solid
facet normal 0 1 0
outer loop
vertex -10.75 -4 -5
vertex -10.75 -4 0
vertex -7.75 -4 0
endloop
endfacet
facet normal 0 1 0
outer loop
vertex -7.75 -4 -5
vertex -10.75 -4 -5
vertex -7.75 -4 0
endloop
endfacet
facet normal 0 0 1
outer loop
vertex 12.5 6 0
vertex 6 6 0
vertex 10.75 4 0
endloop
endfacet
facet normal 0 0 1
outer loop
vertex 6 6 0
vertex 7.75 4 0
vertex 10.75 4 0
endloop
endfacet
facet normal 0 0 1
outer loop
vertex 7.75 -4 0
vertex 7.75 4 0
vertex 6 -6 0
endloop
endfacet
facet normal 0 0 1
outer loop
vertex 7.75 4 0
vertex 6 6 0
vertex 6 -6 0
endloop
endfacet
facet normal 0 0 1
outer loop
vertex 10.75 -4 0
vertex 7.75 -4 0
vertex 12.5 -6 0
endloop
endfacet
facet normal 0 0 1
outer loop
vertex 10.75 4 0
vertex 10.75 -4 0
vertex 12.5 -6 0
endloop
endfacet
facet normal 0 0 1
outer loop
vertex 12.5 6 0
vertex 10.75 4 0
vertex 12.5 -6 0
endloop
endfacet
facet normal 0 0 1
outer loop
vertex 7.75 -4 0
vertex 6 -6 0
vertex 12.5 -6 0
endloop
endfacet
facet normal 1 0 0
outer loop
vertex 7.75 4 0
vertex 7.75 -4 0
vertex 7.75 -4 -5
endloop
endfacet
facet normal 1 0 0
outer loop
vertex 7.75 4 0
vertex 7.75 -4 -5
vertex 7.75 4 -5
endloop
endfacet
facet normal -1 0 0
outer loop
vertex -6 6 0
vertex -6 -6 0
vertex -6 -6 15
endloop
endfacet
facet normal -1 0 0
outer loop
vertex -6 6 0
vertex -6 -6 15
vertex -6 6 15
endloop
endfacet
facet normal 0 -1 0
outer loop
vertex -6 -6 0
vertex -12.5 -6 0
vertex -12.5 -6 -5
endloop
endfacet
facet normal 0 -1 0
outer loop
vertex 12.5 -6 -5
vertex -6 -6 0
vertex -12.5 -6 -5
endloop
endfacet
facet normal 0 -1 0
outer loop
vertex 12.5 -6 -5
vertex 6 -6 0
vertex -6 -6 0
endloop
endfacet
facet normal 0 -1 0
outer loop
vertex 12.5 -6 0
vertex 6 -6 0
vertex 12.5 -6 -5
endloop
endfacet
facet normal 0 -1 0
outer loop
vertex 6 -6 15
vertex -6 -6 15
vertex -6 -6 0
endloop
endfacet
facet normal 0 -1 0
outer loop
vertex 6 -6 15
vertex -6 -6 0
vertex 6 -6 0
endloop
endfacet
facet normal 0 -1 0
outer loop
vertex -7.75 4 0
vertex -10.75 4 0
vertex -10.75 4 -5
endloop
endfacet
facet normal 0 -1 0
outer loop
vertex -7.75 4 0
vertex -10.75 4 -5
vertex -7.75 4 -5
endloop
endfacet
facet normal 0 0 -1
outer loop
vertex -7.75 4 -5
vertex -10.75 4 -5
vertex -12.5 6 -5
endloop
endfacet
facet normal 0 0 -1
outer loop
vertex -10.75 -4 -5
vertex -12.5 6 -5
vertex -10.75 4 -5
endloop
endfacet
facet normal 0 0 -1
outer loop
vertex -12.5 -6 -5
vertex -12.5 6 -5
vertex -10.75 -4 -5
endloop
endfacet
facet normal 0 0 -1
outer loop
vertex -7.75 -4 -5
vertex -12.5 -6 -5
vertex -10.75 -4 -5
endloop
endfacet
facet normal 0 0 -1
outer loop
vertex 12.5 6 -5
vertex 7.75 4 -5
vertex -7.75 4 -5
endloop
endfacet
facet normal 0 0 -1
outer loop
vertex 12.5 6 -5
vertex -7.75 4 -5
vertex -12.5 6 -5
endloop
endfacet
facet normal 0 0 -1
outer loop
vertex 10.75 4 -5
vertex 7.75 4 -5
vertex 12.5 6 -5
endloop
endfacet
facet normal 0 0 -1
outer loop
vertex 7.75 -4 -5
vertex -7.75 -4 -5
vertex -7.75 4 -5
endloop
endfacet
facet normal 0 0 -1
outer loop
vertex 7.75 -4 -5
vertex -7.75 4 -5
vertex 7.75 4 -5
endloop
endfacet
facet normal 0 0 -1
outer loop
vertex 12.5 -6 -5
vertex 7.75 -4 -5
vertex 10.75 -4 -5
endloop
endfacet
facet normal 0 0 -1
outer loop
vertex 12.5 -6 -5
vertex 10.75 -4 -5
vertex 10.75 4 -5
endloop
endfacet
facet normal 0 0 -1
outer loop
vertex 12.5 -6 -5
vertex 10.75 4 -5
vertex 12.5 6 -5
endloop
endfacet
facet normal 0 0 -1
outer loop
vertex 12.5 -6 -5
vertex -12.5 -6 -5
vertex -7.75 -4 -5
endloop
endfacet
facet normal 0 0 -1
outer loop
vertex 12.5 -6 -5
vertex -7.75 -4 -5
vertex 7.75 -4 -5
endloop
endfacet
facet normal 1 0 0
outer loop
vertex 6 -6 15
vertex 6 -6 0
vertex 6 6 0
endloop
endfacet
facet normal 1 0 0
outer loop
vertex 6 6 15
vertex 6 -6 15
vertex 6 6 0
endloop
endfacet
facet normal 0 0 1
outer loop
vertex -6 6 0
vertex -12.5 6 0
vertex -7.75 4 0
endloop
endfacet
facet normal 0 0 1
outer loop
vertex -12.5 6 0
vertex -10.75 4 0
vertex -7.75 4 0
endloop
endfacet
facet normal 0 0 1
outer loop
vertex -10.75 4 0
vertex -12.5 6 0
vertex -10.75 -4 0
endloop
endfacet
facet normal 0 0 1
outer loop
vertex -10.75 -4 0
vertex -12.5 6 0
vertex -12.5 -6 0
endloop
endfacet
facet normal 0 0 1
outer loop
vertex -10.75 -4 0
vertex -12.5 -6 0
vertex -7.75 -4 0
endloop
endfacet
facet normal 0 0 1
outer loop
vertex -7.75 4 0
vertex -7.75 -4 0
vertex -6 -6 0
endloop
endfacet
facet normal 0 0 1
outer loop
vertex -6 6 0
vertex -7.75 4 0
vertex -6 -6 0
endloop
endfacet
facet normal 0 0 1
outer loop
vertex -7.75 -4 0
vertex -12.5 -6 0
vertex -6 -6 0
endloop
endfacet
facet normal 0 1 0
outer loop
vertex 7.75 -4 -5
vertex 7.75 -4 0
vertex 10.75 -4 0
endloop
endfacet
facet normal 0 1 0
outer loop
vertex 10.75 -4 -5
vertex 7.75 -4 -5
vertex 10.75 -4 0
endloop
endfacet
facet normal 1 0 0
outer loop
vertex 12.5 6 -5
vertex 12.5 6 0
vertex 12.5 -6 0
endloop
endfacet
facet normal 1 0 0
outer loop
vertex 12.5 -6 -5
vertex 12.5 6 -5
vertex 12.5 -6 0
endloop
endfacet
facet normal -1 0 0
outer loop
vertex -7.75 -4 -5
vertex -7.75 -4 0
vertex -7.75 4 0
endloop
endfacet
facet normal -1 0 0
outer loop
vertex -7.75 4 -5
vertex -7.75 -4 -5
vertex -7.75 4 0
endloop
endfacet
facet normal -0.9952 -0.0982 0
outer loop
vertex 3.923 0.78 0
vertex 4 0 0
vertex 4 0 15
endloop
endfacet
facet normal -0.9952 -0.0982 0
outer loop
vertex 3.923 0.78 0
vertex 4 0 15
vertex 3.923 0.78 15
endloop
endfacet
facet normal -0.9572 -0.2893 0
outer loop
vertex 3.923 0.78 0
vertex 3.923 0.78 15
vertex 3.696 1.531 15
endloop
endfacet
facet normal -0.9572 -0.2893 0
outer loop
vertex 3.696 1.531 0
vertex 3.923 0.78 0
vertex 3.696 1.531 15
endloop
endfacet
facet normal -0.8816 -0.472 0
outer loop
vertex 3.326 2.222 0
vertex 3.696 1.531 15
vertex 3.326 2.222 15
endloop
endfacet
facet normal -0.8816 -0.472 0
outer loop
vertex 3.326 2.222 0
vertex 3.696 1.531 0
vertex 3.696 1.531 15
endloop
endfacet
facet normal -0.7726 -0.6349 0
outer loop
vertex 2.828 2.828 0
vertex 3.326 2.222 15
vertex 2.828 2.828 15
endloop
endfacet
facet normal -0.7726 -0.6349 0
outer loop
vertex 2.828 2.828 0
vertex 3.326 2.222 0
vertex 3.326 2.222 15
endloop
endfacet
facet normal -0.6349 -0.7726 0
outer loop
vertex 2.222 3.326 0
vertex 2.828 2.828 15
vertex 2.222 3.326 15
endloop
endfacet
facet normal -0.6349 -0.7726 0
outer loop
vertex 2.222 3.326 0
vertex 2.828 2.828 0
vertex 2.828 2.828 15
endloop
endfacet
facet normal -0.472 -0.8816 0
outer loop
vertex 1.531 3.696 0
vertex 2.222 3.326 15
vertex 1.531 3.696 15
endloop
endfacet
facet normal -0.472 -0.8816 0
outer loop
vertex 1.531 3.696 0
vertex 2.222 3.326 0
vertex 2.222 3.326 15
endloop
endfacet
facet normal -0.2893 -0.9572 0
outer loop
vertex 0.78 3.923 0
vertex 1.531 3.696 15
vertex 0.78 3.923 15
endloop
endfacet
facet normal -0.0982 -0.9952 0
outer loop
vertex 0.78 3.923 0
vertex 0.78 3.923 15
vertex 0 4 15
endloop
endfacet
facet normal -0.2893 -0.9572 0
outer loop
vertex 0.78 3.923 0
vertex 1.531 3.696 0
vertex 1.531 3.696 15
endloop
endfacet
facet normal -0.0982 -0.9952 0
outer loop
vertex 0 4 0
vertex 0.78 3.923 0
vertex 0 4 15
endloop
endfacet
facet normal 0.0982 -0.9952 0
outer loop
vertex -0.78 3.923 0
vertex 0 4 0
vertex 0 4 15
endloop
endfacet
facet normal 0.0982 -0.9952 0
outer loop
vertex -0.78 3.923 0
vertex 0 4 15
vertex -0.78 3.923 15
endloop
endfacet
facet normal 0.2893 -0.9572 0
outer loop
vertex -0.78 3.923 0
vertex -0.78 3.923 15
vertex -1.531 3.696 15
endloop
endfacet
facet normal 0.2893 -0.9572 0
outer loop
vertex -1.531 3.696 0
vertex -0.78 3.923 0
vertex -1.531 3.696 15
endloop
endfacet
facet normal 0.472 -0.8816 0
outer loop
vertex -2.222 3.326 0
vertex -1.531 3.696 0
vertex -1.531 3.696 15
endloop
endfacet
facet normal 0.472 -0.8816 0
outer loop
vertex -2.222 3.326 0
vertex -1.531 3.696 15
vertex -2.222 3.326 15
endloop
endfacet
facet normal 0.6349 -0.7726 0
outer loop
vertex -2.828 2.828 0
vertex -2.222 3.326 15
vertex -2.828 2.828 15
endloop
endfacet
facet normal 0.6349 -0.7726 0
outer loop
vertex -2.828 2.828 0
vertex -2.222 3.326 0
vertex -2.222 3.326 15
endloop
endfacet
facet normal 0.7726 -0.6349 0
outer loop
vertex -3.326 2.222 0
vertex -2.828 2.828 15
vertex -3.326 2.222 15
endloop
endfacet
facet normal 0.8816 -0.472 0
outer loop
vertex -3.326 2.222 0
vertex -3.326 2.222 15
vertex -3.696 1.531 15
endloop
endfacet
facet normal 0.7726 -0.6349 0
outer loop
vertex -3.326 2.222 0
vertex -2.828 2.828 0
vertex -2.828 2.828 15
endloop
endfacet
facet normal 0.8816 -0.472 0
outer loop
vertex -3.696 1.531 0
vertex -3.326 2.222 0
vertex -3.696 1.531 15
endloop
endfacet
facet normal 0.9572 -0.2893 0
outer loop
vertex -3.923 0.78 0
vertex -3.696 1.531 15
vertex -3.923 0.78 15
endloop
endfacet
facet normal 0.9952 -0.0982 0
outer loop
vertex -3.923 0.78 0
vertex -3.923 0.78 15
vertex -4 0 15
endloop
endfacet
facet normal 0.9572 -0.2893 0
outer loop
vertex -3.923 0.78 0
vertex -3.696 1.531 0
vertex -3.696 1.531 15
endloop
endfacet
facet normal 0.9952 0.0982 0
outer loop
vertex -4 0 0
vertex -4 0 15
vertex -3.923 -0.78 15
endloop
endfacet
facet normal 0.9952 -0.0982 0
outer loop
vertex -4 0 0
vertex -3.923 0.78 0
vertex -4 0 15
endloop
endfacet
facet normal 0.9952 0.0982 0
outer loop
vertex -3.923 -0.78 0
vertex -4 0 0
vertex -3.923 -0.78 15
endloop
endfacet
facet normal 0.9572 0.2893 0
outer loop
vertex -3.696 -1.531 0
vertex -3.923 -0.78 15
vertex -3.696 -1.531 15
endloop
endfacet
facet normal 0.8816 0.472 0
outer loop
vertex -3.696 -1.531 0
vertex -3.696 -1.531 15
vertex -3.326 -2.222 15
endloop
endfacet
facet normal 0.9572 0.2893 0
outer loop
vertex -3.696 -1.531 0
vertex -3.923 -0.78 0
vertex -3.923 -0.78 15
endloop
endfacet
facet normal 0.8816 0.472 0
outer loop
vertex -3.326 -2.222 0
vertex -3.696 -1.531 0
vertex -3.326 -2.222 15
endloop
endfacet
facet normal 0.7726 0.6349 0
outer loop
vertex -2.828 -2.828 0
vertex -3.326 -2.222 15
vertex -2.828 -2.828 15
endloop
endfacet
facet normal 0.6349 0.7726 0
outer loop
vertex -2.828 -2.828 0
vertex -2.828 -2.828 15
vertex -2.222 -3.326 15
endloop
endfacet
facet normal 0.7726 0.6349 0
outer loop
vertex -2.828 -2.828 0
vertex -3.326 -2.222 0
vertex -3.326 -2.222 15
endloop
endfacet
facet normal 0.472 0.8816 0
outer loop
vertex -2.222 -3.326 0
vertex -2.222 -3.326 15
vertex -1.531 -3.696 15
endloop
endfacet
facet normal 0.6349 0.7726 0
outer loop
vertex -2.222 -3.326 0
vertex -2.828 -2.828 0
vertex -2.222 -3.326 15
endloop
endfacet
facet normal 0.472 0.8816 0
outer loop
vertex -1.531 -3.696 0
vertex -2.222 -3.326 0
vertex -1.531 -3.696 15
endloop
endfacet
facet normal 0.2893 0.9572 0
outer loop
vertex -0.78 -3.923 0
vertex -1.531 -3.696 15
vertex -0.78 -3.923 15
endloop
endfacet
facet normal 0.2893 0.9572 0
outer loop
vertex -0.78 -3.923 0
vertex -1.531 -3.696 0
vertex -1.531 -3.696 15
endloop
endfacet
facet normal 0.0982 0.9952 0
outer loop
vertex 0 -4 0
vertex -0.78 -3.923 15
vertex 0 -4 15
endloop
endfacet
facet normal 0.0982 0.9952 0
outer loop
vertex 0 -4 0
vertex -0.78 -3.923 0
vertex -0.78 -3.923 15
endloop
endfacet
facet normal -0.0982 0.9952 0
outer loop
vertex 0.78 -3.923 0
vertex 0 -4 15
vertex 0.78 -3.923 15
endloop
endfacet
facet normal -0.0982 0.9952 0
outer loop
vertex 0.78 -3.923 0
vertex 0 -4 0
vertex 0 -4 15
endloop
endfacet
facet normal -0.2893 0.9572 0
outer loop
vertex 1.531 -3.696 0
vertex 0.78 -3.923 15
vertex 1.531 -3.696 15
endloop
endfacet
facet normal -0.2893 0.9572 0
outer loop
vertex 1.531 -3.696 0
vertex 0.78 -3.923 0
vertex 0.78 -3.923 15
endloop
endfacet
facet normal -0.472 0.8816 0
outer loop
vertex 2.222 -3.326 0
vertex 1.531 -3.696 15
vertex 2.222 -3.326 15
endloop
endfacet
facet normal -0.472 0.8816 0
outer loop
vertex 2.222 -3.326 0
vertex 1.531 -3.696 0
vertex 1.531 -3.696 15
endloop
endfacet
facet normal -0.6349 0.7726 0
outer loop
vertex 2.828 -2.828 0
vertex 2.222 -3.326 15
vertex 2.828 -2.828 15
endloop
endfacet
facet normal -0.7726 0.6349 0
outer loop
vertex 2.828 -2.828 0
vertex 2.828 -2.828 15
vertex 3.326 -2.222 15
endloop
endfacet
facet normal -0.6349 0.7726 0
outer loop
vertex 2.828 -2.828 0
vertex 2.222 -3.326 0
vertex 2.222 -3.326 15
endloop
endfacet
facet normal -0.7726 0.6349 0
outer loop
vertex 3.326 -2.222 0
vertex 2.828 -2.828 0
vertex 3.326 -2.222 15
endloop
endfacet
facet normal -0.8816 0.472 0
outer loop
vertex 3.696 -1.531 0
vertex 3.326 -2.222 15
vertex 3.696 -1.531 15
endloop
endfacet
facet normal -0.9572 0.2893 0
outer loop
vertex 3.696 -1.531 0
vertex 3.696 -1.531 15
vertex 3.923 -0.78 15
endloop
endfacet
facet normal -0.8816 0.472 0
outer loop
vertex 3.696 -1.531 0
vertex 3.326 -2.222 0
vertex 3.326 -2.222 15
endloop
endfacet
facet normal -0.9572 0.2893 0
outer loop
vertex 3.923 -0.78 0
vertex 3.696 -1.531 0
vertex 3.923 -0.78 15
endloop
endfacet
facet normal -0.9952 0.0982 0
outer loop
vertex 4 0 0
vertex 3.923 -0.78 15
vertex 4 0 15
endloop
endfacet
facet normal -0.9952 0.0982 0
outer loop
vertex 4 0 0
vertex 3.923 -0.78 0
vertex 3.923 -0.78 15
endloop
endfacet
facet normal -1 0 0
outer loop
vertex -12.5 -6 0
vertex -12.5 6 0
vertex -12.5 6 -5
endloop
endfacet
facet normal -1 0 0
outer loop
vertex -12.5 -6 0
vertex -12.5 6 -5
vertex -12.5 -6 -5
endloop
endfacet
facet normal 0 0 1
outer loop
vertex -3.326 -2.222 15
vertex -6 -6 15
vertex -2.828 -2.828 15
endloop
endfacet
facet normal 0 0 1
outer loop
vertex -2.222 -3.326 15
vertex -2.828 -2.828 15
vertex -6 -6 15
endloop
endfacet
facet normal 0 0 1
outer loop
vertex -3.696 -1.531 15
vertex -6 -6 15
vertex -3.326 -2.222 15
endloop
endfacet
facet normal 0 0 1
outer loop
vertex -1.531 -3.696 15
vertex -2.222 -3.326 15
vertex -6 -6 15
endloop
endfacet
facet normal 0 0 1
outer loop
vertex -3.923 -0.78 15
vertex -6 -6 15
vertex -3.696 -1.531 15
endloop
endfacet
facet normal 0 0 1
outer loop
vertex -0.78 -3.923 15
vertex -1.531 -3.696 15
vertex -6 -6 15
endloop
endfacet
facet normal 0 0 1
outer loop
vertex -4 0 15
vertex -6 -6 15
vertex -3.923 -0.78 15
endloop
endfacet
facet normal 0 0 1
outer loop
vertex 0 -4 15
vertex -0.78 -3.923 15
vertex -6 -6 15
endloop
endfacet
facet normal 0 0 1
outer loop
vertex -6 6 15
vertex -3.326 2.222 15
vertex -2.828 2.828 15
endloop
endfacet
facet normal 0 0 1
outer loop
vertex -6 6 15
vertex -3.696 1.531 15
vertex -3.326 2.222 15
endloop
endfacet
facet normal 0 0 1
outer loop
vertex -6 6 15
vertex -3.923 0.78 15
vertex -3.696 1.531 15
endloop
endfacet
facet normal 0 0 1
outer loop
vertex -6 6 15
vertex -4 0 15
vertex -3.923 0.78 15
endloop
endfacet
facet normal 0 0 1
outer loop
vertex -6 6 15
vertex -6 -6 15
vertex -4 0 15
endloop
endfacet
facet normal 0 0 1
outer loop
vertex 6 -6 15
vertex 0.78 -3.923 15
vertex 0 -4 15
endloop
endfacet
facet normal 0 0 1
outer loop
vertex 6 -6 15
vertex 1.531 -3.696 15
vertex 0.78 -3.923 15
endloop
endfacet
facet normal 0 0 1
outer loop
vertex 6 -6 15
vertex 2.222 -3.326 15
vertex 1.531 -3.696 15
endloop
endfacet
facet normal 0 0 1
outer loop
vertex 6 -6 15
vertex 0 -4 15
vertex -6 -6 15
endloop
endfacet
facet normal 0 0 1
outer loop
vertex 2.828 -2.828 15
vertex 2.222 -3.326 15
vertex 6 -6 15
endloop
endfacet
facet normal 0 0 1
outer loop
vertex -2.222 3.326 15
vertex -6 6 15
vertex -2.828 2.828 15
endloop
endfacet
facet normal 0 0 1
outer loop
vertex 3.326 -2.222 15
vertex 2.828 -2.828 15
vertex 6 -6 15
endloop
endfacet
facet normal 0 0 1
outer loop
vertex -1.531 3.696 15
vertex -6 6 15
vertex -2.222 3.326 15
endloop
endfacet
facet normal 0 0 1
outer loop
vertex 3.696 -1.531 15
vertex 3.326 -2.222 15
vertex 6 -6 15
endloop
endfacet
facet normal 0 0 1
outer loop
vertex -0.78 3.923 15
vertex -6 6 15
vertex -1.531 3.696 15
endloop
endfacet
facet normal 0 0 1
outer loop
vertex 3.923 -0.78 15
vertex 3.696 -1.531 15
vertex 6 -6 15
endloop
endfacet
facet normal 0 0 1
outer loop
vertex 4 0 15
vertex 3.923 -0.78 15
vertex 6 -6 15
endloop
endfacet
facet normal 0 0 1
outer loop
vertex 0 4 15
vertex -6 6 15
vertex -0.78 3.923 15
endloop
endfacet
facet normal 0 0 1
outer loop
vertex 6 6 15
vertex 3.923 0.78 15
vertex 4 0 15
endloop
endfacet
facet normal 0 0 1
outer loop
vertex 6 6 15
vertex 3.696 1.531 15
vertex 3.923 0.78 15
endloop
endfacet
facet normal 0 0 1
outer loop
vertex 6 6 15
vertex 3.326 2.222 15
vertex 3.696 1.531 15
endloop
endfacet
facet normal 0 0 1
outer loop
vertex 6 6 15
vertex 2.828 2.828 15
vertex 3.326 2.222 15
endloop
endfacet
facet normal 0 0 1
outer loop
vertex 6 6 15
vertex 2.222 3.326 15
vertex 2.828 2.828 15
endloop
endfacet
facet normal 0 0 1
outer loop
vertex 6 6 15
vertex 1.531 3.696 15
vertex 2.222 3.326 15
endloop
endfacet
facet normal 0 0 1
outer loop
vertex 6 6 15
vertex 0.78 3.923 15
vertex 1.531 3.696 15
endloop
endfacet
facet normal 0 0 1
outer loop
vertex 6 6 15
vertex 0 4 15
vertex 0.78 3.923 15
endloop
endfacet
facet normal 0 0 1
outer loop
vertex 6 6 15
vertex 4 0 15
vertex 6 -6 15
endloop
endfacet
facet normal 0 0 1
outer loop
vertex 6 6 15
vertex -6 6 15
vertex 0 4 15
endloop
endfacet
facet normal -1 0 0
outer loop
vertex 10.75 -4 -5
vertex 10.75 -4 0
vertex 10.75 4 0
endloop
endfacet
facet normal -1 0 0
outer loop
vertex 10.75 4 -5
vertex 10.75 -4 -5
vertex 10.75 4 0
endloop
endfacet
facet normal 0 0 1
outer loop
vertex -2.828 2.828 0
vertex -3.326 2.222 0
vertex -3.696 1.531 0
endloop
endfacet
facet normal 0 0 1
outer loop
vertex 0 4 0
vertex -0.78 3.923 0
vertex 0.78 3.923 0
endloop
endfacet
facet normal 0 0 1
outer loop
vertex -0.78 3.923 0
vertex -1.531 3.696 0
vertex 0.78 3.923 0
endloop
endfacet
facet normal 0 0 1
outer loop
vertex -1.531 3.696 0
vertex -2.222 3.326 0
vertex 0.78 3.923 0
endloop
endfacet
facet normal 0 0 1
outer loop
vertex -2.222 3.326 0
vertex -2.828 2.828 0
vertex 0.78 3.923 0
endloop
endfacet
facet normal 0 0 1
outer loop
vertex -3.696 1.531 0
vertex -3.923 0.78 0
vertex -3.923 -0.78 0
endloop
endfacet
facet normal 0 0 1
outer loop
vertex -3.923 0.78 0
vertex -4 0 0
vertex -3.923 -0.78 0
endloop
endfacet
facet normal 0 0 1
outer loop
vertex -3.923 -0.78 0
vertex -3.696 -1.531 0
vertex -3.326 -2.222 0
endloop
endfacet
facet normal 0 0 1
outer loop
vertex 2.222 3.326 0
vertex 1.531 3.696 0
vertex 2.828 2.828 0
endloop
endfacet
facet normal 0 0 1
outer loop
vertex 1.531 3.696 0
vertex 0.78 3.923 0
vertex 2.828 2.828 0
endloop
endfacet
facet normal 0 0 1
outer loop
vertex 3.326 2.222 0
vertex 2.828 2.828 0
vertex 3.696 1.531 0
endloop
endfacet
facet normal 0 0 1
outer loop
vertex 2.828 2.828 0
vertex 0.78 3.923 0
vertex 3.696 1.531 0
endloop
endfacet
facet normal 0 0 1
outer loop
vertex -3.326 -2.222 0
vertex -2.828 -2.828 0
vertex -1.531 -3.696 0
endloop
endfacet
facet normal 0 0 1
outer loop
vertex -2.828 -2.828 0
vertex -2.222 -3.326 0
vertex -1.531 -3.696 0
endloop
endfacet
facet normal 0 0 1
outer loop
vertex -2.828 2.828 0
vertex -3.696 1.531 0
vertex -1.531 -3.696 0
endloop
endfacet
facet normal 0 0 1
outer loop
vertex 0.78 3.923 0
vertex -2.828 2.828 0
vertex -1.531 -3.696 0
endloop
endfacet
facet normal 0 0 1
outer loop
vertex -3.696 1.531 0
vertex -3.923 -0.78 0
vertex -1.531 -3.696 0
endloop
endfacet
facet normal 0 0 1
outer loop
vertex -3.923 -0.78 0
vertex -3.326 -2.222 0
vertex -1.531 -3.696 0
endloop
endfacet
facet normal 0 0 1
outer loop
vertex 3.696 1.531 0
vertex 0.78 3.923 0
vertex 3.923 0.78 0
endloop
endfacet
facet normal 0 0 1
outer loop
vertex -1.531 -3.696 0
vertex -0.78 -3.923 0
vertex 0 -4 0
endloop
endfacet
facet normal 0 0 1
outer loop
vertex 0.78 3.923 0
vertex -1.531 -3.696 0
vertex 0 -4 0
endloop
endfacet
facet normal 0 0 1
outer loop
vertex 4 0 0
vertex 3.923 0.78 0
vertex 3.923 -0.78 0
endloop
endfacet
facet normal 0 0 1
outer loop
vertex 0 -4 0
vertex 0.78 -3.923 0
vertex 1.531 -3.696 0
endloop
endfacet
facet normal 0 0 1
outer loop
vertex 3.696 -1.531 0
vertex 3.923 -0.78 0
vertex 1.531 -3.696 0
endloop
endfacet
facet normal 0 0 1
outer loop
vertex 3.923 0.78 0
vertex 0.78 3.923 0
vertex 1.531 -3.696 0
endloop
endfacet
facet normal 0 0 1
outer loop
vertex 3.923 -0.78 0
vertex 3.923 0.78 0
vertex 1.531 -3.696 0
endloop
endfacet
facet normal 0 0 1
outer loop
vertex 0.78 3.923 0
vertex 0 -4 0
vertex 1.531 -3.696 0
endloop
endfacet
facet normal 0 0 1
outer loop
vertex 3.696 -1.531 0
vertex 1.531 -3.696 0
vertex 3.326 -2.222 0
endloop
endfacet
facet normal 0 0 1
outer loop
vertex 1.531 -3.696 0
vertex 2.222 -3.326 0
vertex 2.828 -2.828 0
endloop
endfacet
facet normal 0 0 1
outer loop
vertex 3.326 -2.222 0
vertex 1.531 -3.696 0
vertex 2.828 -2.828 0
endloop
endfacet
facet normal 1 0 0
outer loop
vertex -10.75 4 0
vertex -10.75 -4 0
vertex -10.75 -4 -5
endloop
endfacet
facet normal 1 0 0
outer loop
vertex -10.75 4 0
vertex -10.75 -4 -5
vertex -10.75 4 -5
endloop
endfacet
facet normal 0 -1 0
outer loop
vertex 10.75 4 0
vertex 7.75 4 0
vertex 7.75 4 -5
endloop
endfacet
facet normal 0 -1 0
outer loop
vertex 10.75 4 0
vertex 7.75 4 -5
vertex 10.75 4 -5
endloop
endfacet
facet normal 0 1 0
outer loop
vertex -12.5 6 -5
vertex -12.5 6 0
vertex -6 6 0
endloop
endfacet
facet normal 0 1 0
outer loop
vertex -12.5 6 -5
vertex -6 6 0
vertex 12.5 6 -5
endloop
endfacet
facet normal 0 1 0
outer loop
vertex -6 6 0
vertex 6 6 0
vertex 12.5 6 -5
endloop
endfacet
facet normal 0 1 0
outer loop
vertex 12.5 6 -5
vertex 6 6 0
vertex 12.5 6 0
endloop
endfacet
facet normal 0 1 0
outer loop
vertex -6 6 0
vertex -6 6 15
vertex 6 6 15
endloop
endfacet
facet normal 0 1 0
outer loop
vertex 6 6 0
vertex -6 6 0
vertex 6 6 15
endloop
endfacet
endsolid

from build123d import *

# Parameters (mm, degrees)
F0_W     = 12
F0_H     = 12
F0_R     = 4
F1_DEPTH = 15
F2_W     = 25
F2_H     = 12
F3_DEPTH = 5
F4_W     = 3
F4_H     = 8
F5_DEPTH = 5


with BuildPart() as f1:
    # F0 (on Top) → F1 (new body)
    with BuildSketch(Plane.XY):
        Rectangle(F0_W, F0_H)
        Circle(F0_R, mode=Mode.SUBTRACT)
    extrude(amount=F1_DEPTH)

    # F2 (on face) → F3 (join)
    with BuildSketch(Plane(origin=(0, 0, 0), x_dir=(1, 0, 0), z_dir=(0, 0, -1))):
        Rectangle(F2_W, F2_H)
    extrude(amount=F3_DEPTH)

    # F4 (on face) → F5 (cut)
    with BuildSketch(Plane.XY):
        with Locations((-9.25, 0)):
            Rectangle(F4_W, F4_H)
        with Locations((9.25, 0)):
            Rectangle(F4_W, F4_H)
    extrude(amount=-F5_DEPTH, mode=Mode.SUBTRACT)


solid = f1.part
